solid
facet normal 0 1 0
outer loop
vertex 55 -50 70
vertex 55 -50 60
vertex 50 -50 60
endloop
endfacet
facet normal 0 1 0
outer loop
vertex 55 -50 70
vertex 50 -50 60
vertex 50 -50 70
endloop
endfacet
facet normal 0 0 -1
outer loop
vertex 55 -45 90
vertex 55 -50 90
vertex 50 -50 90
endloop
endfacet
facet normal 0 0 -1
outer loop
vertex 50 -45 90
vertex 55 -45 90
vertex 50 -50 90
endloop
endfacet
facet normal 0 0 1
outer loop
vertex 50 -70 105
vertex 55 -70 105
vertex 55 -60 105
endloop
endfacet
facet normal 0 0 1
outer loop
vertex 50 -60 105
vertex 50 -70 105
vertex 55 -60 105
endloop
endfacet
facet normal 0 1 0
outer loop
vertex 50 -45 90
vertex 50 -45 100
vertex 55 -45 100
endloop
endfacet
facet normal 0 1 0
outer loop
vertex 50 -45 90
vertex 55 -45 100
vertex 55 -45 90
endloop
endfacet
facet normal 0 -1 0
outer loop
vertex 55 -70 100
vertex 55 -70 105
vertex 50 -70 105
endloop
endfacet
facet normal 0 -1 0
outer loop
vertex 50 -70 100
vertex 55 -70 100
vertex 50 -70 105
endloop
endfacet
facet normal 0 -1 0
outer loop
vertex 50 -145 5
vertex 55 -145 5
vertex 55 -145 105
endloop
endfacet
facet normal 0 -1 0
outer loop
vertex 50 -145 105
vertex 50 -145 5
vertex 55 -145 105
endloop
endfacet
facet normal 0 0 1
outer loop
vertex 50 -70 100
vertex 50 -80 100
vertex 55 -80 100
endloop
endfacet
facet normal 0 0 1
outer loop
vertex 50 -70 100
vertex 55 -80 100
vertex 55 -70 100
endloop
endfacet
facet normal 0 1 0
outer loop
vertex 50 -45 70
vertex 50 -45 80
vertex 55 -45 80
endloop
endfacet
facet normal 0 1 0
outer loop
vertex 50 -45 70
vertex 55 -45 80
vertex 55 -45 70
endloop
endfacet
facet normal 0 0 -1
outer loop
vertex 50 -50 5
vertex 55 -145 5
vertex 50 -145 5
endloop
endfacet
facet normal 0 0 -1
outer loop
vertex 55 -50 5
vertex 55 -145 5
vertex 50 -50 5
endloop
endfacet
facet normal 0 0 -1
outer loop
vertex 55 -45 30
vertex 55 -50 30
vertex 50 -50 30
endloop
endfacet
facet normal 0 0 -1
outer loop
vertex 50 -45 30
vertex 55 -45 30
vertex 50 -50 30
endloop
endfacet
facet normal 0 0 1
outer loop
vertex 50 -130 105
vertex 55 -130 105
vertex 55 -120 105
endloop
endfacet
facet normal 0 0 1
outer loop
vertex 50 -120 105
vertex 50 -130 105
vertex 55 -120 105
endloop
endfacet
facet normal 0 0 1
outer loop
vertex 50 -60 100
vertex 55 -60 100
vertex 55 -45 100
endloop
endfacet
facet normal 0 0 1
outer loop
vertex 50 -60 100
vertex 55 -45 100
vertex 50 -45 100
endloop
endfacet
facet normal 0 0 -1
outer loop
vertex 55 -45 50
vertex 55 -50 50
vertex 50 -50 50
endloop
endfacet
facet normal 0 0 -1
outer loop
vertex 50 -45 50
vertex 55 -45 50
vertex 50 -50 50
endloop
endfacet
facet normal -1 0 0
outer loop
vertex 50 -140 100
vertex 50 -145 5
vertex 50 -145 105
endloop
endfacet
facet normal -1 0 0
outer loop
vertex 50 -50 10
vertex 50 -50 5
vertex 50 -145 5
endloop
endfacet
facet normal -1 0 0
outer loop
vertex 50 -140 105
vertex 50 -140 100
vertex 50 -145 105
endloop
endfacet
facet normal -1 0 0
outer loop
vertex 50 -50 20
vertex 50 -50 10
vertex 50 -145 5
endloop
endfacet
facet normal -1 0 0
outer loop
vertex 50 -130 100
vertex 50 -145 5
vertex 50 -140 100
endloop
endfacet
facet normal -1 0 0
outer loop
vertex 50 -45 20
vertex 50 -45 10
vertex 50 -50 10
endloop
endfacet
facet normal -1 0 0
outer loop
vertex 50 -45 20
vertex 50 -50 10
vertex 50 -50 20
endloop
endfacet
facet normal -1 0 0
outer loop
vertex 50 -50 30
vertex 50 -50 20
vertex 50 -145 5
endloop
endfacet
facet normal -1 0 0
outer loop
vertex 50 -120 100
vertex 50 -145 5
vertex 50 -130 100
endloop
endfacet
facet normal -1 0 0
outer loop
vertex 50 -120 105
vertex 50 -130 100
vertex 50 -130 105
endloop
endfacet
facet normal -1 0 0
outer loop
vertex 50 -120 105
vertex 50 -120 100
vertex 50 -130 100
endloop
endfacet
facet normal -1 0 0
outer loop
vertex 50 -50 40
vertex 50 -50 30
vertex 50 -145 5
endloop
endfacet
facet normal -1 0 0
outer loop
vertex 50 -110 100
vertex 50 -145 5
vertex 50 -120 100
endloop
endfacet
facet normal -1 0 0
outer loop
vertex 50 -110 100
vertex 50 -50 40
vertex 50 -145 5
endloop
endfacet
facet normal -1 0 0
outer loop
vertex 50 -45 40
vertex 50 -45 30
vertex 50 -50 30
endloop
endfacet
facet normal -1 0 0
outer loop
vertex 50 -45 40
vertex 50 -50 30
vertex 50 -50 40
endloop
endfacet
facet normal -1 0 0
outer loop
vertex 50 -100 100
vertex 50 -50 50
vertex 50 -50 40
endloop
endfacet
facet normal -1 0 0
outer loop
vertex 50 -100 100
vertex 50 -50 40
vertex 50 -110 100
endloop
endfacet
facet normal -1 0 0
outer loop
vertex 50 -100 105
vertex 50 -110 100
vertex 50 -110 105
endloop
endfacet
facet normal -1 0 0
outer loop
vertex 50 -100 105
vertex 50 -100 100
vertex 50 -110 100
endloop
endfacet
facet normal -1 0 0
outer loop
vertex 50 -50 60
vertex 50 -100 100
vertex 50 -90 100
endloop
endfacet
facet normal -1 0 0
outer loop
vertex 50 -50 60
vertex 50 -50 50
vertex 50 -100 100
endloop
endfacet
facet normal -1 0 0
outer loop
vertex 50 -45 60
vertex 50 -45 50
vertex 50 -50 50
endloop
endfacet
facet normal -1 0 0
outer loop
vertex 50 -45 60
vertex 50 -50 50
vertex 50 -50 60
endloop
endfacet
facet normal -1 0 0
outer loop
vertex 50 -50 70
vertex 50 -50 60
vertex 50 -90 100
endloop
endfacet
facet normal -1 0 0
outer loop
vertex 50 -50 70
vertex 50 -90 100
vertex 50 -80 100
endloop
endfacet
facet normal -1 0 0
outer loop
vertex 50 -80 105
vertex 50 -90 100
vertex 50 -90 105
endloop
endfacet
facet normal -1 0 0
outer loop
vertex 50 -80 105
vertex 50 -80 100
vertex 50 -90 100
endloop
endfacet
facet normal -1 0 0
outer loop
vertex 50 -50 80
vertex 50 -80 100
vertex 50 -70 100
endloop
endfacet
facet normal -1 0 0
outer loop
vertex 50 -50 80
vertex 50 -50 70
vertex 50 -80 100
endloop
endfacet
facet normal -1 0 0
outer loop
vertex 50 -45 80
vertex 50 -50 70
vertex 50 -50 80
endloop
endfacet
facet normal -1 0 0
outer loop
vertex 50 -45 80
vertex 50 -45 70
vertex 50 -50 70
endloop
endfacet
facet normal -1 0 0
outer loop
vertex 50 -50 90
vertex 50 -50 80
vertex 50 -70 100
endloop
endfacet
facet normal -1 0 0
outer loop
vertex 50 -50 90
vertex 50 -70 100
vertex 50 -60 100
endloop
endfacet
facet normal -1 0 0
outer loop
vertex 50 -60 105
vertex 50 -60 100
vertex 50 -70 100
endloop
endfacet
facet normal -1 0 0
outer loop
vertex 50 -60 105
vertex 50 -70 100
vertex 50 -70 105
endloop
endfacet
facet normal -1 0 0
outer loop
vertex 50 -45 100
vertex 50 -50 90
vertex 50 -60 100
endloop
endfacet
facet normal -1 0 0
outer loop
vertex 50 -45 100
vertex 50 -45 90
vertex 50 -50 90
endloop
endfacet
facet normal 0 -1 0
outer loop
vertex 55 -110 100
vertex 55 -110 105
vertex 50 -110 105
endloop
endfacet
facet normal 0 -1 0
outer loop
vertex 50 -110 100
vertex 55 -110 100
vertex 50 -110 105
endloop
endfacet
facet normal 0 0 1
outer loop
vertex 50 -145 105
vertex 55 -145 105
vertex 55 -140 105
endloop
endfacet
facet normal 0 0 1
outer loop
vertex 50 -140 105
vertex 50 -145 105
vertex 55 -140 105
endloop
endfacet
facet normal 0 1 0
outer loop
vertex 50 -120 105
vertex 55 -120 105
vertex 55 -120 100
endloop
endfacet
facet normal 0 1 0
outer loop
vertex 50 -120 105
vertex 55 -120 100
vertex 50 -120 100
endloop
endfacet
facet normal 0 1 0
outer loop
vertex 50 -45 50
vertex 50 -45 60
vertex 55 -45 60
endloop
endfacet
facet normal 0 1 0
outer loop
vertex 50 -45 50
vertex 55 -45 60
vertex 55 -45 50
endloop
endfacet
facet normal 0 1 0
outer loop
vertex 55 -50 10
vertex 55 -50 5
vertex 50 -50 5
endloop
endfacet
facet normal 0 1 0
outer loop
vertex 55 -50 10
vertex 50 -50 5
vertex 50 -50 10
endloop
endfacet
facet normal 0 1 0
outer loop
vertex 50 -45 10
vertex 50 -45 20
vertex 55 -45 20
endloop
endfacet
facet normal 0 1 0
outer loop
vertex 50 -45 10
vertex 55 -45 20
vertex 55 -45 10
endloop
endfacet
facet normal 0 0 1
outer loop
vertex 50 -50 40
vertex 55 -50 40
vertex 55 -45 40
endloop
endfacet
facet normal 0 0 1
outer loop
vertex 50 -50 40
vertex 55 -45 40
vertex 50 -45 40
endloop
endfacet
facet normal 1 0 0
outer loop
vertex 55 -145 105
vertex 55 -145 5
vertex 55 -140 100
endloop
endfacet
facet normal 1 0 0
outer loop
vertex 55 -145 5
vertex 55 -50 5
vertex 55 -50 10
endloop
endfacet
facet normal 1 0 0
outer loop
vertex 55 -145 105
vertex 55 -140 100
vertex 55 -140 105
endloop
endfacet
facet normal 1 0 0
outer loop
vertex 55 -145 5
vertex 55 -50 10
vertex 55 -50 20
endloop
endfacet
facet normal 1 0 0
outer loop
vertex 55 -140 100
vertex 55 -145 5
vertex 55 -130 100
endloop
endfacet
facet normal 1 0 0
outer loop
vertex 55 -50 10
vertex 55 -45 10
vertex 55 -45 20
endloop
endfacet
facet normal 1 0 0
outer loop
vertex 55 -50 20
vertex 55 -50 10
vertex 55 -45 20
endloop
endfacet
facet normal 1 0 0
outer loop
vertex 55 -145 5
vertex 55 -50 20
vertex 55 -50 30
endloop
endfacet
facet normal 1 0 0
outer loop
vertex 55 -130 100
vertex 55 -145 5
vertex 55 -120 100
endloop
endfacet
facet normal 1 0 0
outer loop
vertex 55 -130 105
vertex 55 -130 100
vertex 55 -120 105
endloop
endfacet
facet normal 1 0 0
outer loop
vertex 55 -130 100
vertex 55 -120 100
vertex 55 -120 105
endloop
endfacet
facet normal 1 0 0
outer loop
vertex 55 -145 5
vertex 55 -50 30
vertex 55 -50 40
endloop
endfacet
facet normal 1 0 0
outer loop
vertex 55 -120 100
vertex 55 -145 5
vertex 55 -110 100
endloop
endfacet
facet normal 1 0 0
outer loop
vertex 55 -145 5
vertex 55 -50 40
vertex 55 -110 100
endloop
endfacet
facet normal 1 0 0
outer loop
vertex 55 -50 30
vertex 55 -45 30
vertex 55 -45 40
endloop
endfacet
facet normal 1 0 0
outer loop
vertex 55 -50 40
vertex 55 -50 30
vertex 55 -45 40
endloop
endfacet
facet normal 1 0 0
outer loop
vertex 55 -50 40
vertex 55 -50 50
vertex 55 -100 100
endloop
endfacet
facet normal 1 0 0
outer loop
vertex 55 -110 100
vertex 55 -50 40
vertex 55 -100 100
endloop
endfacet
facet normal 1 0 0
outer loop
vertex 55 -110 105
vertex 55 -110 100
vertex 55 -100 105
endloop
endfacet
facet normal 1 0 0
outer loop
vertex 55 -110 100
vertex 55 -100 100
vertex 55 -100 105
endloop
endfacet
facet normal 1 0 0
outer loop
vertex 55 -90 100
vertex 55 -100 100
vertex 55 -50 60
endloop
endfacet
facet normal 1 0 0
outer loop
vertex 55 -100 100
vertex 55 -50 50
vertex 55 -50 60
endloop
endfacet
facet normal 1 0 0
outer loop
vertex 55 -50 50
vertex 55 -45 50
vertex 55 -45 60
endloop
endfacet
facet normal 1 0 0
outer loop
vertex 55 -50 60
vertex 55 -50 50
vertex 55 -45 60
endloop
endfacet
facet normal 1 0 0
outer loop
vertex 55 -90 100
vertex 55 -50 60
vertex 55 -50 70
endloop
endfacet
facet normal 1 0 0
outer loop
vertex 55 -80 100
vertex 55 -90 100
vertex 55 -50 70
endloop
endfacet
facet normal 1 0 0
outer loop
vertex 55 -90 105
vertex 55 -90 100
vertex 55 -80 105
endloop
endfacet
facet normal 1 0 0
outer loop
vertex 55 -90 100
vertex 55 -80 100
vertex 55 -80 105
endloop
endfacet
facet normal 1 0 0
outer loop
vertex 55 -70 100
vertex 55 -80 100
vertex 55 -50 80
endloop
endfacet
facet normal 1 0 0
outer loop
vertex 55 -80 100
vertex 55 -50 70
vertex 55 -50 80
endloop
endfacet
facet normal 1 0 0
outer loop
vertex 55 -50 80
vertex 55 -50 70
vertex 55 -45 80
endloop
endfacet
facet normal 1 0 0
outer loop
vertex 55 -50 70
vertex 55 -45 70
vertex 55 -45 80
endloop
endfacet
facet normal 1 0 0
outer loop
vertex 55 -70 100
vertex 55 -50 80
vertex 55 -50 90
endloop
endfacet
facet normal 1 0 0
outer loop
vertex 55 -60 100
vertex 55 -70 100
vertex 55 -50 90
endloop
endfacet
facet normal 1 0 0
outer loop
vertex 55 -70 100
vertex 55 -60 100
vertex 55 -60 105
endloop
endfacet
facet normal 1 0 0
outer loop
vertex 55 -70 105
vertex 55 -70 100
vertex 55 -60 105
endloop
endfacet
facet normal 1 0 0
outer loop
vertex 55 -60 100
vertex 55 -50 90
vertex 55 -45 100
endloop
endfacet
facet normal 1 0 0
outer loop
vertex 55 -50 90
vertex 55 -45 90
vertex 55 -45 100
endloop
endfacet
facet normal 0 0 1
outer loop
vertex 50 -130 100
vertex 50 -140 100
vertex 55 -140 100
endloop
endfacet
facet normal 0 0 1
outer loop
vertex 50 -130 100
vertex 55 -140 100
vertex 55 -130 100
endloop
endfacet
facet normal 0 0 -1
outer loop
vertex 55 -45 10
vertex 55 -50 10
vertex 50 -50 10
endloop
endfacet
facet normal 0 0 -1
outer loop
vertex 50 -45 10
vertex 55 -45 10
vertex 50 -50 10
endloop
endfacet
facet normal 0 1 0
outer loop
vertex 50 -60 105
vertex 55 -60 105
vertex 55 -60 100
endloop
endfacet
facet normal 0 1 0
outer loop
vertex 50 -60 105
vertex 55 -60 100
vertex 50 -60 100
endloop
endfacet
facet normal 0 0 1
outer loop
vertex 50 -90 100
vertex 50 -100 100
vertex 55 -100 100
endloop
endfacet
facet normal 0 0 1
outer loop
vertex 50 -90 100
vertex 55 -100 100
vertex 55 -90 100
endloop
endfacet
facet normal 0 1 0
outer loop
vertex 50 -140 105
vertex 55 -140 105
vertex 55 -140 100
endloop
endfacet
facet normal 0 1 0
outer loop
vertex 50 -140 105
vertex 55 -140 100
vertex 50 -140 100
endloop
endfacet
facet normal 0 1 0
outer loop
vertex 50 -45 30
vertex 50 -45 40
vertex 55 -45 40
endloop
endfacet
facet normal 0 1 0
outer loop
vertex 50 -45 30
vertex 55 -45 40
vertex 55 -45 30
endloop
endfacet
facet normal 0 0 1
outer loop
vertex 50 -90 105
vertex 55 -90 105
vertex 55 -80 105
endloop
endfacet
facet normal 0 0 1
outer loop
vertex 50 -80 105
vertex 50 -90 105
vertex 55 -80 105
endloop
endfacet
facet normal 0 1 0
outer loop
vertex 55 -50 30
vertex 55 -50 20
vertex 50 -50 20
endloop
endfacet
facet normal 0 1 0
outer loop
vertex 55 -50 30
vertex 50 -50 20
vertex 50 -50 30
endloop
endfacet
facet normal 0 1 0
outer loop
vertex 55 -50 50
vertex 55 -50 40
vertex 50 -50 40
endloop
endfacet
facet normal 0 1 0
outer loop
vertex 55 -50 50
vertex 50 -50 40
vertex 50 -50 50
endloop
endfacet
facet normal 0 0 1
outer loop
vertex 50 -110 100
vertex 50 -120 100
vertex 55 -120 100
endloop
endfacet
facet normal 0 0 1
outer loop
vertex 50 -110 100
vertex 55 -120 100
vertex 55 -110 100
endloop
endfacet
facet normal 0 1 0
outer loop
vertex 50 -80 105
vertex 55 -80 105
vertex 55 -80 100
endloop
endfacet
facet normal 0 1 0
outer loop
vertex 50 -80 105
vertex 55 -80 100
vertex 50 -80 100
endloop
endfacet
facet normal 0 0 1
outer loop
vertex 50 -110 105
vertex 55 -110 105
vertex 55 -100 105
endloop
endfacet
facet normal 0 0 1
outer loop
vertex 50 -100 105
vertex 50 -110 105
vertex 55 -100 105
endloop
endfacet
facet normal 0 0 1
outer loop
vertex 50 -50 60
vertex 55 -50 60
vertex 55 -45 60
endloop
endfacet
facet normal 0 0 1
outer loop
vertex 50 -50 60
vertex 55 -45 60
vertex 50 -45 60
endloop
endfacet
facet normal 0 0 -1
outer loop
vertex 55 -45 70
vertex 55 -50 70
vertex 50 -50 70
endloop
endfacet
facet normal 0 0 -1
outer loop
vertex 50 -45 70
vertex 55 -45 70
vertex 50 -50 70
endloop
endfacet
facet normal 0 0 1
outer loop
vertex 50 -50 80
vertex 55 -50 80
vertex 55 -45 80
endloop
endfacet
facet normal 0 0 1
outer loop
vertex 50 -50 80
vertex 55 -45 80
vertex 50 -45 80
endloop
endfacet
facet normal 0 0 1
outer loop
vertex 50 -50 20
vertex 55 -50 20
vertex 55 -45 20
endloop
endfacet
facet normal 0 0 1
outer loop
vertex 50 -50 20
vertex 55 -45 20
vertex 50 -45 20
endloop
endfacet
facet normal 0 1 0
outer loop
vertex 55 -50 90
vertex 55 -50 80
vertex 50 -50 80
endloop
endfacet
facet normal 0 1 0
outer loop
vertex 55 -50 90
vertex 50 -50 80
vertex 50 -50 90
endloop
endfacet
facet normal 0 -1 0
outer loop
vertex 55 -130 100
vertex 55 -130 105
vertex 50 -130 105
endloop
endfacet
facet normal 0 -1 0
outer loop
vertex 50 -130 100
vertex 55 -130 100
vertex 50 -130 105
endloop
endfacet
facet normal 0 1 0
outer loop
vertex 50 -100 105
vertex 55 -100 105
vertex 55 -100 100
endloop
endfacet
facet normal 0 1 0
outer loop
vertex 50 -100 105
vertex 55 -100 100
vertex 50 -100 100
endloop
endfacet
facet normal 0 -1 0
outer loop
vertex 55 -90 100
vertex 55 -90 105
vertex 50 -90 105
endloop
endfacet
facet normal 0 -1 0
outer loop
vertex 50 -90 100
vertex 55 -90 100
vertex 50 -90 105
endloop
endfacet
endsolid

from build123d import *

# Parameters (mm, degrees)
SKETCH092_W             = 100
SKETCH092_H             = 95
PAD051_DEPTH            = 5
SKETCH115_W             = 10
SKETCH115_H             = 5
PAD071_DEPTH            = 5
LINEARPATTERN067_COUNT  = 5
LINEARPATTERN067_PITCH  = 20
SKETCH116_W             = 10
SKETCH116_H             = 5
POCKET027_DEPTH         = 5
LINEARPATTERN068_COUNT  = 5
LINEARPATTERN068_PITCH  = 20
BODY036_PLACEMENT_ANGLE = 90


with BuildPart() as part:
    # Sketch092 → Pad051 (new body)
    with BuildSketch(Plane.XY):
        Rectangle(SKETCH092_W, SKETCH092_H)
    extrude(amount=PAD051_DEPTH)

    # Sketch115 (on DatumPlane) → Pad071 (join)
    with BuildSketch(Plane(origin=(0, 47.5, 0), x_dir=(-1, 0, 0), z_dir=(0, 1, 0))):
        with Locations((-40, 2.5)):
            Rectangle(SKETCH115_W, SKETCH115_H)
    pad071 = extrude(amount=PAD071_DEPTH)

    # LinearPattern067: Pad071 ×5
    with Locations(*[(-i * LINEARPATTERN067_PITCH, 0, 0) for i in range(1, LINEARPATTERN067_COUNT)]):
        add(pad071)

    # Sketch116 (on DatumPlane) → Pocket027 (cut)
    with BuildSketch(Plane.YZ.offset(50)):
        with Locations((-37.5, 2.5)):
            Rectangle(SKETCH116_W, SKETCH116_H)
    pocket027 = extrude(amount=-POCKET027_DEPTH, mode=Mode.SUBTRACT)

    # LinearPattern068: Pocket027 ×5
    with Locations(*[(0, i * LINEARPATTERN068_PITCH, 0) for i in range(1, LINEARPATTERN068_COUNT)]):
        add(pocket027, mode=Mode.SUBTRACT)


with BuildPart() as part_1:
    # Body036 placement: moved
    add(part.part.moved(Location((55, -97.5, 55))).rotate(Axis((55, -97.5, 55), (0, -1, 0)), BODY036_PLACEMENT_ANGLE))


solid = part_1.part
